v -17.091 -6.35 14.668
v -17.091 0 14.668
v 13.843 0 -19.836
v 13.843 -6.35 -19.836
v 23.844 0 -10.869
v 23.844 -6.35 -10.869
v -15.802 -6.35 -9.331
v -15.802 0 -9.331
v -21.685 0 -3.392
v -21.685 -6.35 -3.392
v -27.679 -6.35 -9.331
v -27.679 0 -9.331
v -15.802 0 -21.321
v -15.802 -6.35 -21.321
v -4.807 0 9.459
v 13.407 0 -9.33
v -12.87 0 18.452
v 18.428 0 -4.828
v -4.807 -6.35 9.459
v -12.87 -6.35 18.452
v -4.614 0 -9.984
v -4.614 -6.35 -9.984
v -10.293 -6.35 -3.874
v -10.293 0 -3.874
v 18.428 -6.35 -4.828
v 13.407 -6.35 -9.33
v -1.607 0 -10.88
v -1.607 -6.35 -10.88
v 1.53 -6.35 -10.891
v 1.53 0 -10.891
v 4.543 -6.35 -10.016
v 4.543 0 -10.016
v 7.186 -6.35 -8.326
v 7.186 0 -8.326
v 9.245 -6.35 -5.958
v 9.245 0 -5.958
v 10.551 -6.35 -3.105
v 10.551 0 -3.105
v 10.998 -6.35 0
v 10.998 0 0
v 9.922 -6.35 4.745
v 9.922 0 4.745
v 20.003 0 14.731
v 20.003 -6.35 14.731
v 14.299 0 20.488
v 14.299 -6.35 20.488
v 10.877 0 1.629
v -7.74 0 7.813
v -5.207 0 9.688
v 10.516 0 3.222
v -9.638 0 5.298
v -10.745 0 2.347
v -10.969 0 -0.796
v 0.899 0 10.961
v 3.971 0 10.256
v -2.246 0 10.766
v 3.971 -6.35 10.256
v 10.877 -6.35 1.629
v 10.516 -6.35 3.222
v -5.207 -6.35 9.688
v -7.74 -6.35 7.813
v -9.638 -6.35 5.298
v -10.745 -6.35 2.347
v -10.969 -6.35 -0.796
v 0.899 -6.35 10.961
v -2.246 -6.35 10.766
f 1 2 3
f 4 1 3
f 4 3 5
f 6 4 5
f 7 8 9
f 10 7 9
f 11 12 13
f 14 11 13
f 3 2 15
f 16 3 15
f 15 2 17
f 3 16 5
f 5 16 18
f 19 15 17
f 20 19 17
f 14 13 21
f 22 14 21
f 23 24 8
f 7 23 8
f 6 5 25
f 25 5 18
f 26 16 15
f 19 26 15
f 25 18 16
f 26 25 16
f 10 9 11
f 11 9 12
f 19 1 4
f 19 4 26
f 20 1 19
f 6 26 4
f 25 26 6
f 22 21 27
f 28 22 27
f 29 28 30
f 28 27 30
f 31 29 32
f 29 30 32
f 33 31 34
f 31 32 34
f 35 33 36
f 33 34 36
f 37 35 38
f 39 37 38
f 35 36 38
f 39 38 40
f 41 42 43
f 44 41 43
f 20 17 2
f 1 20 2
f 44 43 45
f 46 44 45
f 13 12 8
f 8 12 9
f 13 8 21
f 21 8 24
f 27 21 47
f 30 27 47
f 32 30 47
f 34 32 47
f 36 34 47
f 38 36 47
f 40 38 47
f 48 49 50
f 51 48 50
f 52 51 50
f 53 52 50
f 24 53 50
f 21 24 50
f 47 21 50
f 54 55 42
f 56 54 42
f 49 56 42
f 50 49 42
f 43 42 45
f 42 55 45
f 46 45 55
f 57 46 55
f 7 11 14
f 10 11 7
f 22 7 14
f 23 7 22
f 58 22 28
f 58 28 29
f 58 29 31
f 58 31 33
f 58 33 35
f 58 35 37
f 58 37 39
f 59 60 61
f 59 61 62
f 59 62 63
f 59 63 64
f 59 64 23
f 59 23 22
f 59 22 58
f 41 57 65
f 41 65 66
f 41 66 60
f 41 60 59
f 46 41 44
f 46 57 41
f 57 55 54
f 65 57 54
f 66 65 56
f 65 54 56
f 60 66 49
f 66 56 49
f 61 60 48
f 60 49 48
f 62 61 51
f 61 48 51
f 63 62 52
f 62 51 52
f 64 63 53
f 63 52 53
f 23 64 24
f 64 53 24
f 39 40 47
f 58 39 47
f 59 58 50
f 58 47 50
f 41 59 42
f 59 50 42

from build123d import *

# Parameters (mm, degrees)
F2_DEPTH = 6.35


with BuildPart() as f2:
    # F1 (on Front) → F2 (new body)
    with BuildSketch(Plane.XZ):
        Polygon((13.4068555883, -9.3299626637), (-4.8068021424, 9.4585465267), (-12.8698255867, 18.4519197792), (-17.0908423278, 14.6675603418), (13.8431015945, -19.8356884441), (23.8443027513, -10.86909525), (18.4282055772, -4.8280631489), align=None)
    extrude(amount=F2_DEPTH)


with BuildPart() as f2b:
    # F0 (on Front) → F2, piece 2 (new body)
    with BuildSketch(Plane.XZ):
        with BuildLine():
            Line((-15.801968473, -21.3205300156), (-4.6135591432, -9.9837605777))
            ThreePointArc((-4.6135591432, -9.9837605777), (-8.0552426423, -7.4882220328), (-10.2933787472, -3.8738555997))
            Line((-10.2933787472, -3.8738555997), (-15.801968473, -9.3307923181))
            Line((-15.801968473, -9.3307923181), (-21.6846778428, -3.3923997609))
            Line((-21.6846778428, -3.3923997609), (-27.6792806605, -9.3307923181))
            Line((-27.6792806605, -9.3307923181), (-15.801968473, -21.3205300156))
        make_face()
        with BuildLine():
            ThreePointArc((3.9706552641, 10.2564272539), (7.4730983496, 8.0692753266), (9.9221234412, 4.744667497))
            Line((9.9221234412, 4.744667497), (20.0025010854, 14.7305233404))
            Line((20.0025010854, 14.7305233404), (14.2990431264, 20.4879677704))
            Line((14.2990431264, 20.4879677704), (3.9706552641, 10.2564272539))
        make_face()
        with BuildLine():
            Line((-10.2933787472, -3.8738555997), (3.9706552641, 10.2564272539))
            ThreePointArc((3.9706552641, 10.2564272539), (-7.7401829075, 7.8134481376), (-10.2933787472, -3.8738555997))
        make_face()
        with BuildLine():
            ThreePointArc((-4.6135591432, -9.9837605777), (5.925350499, -9.2655612191), (10.9982, 0))
            ThreePointArc((10.9982, 0), (10.7258076915, 2.4325814692), (9.9221234412, 4.744667497))
            Line((9.9221234412, 4.744667497), (-4.6135591432, -9.9837605777))
        make_face()
        with BuildLine():
            Line((-4.6135591432, -9.9837605777), (9.9221234412, 4.744667497))
            ThreePointArc((9.9221234412, 4.744667497), (7.4730983496, 8.0692753266), (3.9706552641, 10.2564272539))
            Line((3.9706552641, 10.2564272539), (-10.2933787472, -3.8738555997))
            ThreePointArc((-10.2933787472, -3.8738555997), (-8.0552426423, -7.4882220328), (-4.6135591432, -9.9837605777))
        make_face()
    extrude(amount=F2_DEPTH)


solid = Compound([f2.part, f2b.part])
